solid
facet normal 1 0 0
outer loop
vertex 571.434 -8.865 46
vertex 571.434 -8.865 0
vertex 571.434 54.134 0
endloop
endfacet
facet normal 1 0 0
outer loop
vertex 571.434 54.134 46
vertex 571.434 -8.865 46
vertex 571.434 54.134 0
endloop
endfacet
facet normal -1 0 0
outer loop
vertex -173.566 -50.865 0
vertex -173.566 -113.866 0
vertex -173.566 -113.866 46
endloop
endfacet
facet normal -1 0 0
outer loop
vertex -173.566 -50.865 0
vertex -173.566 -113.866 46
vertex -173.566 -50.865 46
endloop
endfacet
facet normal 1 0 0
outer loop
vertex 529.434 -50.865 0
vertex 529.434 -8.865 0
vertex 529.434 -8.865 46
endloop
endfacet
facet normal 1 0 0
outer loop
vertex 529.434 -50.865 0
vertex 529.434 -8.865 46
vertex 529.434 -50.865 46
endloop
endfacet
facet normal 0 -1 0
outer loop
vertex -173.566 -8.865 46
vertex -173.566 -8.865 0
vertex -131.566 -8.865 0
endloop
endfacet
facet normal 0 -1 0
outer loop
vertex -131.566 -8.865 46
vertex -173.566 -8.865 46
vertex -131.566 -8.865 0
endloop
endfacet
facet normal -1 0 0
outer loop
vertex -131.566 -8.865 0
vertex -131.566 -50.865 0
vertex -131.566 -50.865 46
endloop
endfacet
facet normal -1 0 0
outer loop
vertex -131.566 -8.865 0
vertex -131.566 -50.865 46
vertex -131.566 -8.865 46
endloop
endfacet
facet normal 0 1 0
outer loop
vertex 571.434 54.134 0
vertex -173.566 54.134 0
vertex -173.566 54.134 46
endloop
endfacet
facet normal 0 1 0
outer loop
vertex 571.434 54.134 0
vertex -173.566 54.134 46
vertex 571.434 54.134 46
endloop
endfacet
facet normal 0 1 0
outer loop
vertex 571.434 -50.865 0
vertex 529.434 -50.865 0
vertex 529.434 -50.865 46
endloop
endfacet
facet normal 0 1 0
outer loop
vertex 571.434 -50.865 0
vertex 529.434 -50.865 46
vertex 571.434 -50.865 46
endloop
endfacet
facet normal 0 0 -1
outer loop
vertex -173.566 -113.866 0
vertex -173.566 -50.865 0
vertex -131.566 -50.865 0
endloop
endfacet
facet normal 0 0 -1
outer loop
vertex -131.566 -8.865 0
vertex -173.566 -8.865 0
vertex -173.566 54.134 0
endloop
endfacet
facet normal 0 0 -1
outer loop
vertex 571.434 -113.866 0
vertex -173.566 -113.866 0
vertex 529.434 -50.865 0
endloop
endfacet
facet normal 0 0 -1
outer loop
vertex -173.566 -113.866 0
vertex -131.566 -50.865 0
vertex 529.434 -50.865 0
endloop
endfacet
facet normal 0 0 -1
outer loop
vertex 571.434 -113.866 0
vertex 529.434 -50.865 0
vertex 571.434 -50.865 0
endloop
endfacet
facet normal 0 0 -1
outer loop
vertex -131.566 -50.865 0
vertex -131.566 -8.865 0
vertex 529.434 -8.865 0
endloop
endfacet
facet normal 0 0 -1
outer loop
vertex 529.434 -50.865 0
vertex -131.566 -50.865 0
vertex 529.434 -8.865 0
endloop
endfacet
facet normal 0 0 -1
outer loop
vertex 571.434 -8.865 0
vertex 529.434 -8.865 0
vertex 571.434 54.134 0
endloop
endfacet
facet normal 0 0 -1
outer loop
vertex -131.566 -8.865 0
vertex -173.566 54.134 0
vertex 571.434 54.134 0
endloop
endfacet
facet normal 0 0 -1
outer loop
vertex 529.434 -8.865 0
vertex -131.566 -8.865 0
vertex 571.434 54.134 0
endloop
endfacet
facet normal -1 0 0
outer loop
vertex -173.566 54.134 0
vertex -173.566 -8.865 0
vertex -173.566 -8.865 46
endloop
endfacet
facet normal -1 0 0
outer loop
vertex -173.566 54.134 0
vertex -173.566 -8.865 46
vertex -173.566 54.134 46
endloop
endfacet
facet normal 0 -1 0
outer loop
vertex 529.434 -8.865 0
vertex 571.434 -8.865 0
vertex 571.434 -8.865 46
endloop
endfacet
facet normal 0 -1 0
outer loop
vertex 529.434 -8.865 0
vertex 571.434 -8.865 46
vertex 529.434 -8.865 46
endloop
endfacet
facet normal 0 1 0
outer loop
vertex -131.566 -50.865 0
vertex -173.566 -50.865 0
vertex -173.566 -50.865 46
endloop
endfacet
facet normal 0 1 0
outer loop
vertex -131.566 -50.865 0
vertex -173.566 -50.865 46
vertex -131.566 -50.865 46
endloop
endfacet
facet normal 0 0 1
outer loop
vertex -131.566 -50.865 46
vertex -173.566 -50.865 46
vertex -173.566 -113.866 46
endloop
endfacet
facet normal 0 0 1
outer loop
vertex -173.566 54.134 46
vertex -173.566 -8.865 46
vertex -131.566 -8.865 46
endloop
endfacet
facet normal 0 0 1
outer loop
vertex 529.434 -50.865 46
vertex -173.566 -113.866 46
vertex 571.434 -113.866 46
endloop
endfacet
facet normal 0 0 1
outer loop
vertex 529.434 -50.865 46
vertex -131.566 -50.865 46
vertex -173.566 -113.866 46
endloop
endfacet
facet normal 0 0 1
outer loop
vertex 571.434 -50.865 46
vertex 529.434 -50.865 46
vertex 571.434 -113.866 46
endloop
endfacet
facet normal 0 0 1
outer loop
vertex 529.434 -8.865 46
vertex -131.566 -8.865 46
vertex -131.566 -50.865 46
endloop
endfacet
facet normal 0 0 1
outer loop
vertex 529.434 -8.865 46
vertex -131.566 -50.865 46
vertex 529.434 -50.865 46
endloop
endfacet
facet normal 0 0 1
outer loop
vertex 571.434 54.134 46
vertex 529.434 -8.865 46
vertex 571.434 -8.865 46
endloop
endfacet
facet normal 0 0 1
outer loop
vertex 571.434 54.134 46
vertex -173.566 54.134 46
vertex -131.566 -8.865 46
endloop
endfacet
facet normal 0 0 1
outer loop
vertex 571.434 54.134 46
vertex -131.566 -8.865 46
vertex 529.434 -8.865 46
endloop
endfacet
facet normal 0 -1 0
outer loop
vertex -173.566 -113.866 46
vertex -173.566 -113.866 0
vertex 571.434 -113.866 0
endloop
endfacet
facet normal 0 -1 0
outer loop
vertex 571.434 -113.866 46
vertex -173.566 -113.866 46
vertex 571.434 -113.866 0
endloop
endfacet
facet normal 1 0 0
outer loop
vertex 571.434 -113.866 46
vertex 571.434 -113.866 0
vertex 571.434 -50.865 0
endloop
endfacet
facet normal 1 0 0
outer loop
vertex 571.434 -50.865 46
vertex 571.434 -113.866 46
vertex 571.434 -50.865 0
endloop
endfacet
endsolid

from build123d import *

# Parameters (mm, degrees)
F0_W     = 745
F0_H     = 168
F1_DEPTH = 46
F3_DEPTH = 46
F4_W     = 42
F4_H     = 42
F5_DEPTH = 46


with BuildPart() as f1:
    # F0 (on Top) → F1 (new body)
    with BuildSketch(Plane.XY):
        with Locations((198.933674, -29.865599)):
            Rectangle(F0_W, F0_H)
    extrude(amount=F1_DEPTH)

    # F2 (on face) → F3 (cut)
    with BuildSketch(Plane.XY.offset(46)):
        Polygon((529.433674, -8.864585), (529.433674, -29.865599), (529.433674, -50.864585), (571.433674, -50.864585), (571.433674, -8.864585), align=None)
    extrude(amount=-F3_DEPTH, mode=Mode.SUBTRACT)

    # F4 (on face) → F5 (cut)
    with BuildSketch(Plane.XY.offset(46)):
        with Locations((-152.566326, -29.864585)):
            Rectangle(F4_W, F4_H)
    extrude(amount=-F5_DEPTH, mode=Mode.SUBTRACT)


solid = f1.part
